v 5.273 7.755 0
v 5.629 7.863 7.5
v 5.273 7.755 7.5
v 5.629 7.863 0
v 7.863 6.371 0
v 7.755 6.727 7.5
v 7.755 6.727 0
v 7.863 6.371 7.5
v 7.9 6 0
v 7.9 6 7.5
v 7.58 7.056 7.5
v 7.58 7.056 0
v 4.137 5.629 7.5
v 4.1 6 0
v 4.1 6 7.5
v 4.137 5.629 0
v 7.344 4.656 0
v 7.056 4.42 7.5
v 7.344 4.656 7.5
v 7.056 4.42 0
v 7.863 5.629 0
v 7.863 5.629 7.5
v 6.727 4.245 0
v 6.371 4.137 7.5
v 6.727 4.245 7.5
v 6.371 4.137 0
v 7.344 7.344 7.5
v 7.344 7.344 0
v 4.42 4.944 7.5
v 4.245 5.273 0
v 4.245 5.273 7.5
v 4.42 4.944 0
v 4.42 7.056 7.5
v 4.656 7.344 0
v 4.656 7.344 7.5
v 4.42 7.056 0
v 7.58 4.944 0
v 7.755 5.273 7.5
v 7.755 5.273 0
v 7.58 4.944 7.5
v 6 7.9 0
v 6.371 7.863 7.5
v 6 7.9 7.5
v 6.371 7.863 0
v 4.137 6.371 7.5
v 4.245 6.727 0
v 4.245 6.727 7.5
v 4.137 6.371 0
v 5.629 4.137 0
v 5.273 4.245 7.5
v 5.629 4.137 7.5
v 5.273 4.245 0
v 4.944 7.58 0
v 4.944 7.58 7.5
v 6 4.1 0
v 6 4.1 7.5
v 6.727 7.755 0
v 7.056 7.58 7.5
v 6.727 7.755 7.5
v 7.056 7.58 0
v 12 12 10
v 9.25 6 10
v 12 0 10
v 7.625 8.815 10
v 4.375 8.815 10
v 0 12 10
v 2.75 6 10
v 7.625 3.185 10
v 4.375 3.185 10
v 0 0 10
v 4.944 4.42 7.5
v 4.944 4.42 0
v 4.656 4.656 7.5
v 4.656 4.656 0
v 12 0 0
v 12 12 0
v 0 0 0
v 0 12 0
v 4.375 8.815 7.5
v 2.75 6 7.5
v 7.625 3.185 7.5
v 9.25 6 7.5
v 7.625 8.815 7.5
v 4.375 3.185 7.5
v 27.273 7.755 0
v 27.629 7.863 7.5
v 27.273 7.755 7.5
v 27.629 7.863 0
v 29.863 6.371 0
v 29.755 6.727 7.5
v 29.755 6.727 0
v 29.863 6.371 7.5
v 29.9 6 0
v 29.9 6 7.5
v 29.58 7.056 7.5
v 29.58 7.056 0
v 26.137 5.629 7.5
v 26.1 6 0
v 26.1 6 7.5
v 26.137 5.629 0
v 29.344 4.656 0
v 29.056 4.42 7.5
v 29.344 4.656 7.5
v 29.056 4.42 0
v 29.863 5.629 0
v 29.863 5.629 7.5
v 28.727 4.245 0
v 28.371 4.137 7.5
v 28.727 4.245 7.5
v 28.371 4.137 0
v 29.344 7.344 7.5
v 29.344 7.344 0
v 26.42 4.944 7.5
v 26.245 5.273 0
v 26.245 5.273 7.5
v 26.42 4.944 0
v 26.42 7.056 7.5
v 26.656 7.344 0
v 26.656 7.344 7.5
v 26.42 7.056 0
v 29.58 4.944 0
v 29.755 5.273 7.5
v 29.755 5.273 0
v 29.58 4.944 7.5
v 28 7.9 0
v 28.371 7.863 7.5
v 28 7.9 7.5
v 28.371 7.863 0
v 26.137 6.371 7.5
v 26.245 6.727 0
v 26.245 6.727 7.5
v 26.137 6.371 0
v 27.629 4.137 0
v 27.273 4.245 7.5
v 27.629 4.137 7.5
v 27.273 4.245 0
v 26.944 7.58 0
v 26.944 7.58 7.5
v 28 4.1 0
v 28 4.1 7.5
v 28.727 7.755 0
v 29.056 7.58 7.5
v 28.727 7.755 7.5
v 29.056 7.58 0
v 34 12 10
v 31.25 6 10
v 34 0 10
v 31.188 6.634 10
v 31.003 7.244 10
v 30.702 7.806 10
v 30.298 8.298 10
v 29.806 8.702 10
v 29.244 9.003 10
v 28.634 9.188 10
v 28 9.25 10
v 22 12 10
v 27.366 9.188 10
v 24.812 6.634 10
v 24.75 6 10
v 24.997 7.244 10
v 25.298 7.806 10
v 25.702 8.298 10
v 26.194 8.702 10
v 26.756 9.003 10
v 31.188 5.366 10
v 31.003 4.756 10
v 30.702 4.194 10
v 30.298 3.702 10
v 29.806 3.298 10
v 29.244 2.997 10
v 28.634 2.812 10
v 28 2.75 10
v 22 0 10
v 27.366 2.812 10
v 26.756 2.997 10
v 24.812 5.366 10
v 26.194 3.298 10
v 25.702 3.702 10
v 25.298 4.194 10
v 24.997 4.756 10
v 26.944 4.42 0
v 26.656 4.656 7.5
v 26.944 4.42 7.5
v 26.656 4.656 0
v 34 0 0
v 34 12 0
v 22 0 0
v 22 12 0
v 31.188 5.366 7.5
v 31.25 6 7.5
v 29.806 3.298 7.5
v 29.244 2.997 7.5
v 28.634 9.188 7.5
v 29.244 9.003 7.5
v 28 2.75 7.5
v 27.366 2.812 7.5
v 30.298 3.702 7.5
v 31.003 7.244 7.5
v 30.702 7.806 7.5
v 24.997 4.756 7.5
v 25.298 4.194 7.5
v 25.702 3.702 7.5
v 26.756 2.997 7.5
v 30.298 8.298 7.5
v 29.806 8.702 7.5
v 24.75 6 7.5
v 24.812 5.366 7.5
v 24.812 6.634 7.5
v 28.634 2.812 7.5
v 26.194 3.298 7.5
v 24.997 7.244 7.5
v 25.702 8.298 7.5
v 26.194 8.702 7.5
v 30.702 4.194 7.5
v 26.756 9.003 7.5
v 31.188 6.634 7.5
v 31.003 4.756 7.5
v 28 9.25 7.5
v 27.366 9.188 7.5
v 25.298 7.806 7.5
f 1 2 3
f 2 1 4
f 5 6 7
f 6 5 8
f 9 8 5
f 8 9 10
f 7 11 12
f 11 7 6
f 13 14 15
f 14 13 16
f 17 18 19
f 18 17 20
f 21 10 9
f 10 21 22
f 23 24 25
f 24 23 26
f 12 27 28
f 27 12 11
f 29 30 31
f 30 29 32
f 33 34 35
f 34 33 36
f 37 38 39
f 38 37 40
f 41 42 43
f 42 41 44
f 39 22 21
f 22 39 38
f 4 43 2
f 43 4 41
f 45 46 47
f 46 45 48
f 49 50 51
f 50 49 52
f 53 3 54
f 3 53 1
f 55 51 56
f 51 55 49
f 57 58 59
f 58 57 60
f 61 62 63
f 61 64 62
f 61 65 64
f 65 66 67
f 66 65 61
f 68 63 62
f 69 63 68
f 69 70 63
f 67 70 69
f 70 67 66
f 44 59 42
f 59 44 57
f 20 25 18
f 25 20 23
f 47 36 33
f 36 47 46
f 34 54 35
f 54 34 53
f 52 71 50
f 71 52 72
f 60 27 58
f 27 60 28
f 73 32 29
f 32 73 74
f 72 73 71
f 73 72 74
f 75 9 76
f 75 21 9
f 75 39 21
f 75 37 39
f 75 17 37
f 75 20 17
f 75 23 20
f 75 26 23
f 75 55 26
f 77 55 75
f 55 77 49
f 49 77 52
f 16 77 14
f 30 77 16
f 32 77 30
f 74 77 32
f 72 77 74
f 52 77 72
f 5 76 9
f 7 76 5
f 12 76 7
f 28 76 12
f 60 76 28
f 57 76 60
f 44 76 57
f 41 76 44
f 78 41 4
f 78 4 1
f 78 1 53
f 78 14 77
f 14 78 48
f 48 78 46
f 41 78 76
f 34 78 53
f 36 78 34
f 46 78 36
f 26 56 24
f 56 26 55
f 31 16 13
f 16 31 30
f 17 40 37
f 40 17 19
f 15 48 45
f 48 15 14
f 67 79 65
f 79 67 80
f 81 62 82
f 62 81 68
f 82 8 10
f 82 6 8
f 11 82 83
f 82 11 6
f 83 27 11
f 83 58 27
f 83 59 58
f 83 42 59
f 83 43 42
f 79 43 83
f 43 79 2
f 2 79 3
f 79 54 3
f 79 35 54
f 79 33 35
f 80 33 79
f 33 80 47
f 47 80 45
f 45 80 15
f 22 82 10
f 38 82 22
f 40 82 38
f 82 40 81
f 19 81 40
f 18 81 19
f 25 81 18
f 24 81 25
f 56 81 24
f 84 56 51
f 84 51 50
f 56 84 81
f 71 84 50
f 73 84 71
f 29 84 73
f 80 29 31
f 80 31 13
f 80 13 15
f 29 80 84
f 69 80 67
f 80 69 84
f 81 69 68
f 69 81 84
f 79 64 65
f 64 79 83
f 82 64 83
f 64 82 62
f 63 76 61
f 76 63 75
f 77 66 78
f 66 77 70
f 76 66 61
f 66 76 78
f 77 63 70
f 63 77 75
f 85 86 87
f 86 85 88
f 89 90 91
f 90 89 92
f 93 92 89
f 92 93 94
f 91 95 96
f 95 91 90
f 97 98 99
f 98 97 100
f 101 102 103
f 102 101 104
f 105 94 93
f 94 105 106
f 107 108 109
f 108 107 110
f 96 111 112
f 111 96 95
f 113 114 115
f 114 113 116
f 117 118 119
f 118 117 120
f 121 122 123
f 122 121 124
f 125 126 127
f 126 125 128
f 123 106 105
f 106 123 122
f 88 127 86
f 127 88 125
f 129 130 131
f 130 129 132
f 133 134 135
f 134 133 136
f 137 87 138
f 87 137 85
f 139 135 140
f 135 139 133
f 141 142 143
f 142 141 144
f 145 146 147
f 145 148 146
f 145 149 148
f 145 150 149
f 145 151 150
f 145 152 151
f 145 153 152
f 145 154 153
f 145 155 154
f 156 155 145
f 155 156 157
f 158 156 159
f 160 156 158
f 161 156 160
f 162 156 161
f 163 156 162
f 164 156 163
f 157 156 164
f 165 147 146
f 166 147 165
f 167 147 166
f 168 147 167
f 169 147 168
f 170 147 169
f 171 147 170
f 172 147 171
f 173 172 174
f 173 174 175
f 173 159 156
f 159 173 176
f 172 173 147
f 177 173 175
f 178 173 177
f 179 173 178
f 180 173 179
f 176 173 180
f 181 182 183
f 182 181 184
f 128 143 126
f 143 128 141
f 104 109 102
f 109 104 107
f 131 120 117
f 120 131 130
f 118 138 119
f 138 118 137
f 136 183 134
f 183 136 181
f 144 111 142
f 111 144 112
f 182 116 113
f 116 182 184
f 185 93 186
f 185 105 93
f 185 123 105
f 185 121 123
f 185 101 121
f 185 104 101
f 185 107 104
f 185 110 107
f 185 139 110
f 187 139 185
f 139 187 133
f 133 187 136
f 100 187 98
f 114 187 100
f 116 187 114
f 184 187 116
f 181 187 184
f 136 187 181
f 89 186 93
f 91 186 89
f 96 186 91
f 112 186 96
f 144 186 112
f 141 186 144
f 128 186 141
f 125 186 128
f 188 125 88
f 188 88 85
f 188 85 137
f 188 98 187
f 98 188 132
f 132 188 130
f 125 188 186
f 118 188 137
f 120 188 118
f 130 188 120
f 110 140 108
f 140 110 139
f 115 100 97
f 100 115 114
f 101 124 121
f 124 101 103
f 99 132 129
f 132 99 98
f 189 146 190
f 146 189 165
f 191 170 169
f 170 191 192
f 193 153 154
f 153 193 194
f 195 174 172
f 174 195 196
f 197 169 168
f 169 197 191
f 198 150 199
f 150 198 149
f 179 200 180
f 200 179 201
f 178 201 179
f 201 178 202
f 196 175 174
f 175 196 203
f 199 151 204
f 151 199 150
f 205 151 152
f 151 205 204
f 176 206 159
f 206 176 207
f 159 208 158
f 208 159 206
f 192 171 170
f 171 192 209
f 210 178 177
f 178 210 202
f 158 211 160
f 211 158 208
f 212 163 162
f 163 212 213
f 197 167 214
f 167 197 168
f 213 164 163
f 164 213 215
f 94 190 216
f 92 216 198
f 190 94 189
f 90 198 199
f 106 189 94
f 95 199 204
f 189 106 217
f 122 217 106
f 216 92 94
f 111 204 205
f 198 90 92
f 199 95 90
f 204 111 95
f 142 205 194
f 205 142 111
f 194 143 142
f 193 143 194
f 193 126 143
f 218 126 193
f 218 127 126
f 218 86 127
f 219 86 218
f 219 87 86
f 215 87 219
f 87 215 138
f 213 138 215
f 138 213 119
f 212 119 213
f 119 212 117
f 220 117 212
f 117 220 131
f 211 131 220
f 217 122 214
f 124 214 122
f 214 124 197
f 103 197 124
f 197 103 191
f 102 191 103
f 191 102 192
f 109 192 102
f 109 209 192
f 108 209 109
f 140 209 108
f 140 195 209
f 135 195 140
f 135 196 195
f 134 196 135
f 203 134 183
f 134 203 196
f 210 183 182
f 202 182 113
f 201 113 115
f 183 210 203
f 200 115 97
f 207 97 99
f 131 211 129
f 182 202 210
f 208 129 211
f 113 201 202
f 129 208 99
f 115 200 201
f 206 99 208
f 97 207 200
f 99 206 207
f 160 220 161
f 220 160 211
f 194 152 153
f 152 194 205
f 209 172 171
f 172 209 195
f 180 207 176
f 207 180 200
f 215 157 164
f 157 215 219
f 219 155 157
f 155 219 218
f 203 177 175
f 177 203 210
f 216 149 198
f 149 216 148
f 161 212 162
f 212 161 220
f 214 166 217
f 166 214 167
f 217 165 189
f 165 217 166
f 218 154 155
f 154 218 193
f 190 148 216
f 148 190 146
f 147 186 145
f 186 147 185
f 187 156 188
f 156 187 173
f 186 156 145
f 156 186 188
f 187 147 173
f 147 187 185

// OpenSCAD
// file: nut-bolt.scad
// format: [hole_diameter, height, diameter]
_STD_TABLE = [
    [2.5, 2, 5.4],
    [3, 2.5, 6.3],
    [4, 3.2, 8],
    [5, 4.49, 9],
    [6, 4.95, 11.3],
    [8, 6.3, 14.5],
    [10, 7.9, 18.3],
    [12, 9.75, 20.3]
];

SAFE_MARGIN = 0.2;

echo("-----------------------------");
echo("Size indexes");
for(idx=[0:len(_STD_TABLE)-1]) {
    echo(idx, str("M", _STD_TABLE[idx][0]));
}
echo("-----------------------------");

module m_nut(inner, outer, nut_height, model_height, fn=6, taper = false) {
    inner_r = inner/2 + SAFE_MARGIN * 2;
    outer_r = outer / 2 + SAFE_MARGIN / 2;
    outer_r2 = taper ? inner_r : outer_r;
    translate([0, 0, model_height]) {
        mirror([0, 0, 1]) {
            cylinder(r=inner_r, h=model_height, center=false, $fn = 32);
            cylinder(r=outer_r, r2 = outer_r2, h=nut_height, center=false, $fn = fn);
        }
    }
}

module m_bolt(inner, outer, nut_height, model_height, _taper) {
    m_nut(inner, outer, nut_height, model_height, fn=32, taper = _taper);
}

module m_nut_cutout(
    std_idx = 0,
    height = 10,
    coords = []
) {
    HOLE_DIAMETER = _STD_TABLE[std_idx][0];
    HEIGHT = _STD_TABLE[std_idx][1];
    DIAMETER = _STD_TABLE[std_idx][2];

    difference() {
        children();
        for(i=[0:len(coords) - 1]) {
            translate([coords[i][0], coords[i][1], 0])
                m_nut(inner = HOLE_DIAMETER, outer = DIAMETER, nut_height = HEIGHT, model_height = height);
        }
    }
}

module m_bolt_cutout(
    std_idx = 0,
    height = 10,
    coords = [],
    cap_height,
    taper
) {
    HOLE_DIAMETER = _STD_TABLE[std_idx][0];
    HEIGHT = cap_height == undef ? _STD_TABLE[std_idx][1] : cap_height;
    DIAMETER = _STD_TABLE[std_idx][2];

    difference() {
        children();
        for(i=[0:len(coords) - 1]) {
            translate([coords[i][0], coords[i][1], 0])
                m_bolt(inner = HOLE_DIAMETER, outer = DIAMETER, nut_height = HEIGHT, model_height = height, _taper = taper);
        }
    }
}
// main file
include <./nut-bolt.scad>

SIZE = 12;

COORDS = [
    [SIZE/2, SIZE/2]
];

HEIGHT = 10;

render() {
    m_nut_cutout(std_idx = 1, height = HEIGHT, coords = COORDS)
        cube([SIZE, SIZE, HEIGHT]);

    translate([SIZE + 10, 0, 0])
        m_bolt_cutout(std_idx = 1, height = HEIGHT, coords = COORDS, cap_height = 2.5)
            cube([SIZE, SIZE, HEIGHT]);
}
